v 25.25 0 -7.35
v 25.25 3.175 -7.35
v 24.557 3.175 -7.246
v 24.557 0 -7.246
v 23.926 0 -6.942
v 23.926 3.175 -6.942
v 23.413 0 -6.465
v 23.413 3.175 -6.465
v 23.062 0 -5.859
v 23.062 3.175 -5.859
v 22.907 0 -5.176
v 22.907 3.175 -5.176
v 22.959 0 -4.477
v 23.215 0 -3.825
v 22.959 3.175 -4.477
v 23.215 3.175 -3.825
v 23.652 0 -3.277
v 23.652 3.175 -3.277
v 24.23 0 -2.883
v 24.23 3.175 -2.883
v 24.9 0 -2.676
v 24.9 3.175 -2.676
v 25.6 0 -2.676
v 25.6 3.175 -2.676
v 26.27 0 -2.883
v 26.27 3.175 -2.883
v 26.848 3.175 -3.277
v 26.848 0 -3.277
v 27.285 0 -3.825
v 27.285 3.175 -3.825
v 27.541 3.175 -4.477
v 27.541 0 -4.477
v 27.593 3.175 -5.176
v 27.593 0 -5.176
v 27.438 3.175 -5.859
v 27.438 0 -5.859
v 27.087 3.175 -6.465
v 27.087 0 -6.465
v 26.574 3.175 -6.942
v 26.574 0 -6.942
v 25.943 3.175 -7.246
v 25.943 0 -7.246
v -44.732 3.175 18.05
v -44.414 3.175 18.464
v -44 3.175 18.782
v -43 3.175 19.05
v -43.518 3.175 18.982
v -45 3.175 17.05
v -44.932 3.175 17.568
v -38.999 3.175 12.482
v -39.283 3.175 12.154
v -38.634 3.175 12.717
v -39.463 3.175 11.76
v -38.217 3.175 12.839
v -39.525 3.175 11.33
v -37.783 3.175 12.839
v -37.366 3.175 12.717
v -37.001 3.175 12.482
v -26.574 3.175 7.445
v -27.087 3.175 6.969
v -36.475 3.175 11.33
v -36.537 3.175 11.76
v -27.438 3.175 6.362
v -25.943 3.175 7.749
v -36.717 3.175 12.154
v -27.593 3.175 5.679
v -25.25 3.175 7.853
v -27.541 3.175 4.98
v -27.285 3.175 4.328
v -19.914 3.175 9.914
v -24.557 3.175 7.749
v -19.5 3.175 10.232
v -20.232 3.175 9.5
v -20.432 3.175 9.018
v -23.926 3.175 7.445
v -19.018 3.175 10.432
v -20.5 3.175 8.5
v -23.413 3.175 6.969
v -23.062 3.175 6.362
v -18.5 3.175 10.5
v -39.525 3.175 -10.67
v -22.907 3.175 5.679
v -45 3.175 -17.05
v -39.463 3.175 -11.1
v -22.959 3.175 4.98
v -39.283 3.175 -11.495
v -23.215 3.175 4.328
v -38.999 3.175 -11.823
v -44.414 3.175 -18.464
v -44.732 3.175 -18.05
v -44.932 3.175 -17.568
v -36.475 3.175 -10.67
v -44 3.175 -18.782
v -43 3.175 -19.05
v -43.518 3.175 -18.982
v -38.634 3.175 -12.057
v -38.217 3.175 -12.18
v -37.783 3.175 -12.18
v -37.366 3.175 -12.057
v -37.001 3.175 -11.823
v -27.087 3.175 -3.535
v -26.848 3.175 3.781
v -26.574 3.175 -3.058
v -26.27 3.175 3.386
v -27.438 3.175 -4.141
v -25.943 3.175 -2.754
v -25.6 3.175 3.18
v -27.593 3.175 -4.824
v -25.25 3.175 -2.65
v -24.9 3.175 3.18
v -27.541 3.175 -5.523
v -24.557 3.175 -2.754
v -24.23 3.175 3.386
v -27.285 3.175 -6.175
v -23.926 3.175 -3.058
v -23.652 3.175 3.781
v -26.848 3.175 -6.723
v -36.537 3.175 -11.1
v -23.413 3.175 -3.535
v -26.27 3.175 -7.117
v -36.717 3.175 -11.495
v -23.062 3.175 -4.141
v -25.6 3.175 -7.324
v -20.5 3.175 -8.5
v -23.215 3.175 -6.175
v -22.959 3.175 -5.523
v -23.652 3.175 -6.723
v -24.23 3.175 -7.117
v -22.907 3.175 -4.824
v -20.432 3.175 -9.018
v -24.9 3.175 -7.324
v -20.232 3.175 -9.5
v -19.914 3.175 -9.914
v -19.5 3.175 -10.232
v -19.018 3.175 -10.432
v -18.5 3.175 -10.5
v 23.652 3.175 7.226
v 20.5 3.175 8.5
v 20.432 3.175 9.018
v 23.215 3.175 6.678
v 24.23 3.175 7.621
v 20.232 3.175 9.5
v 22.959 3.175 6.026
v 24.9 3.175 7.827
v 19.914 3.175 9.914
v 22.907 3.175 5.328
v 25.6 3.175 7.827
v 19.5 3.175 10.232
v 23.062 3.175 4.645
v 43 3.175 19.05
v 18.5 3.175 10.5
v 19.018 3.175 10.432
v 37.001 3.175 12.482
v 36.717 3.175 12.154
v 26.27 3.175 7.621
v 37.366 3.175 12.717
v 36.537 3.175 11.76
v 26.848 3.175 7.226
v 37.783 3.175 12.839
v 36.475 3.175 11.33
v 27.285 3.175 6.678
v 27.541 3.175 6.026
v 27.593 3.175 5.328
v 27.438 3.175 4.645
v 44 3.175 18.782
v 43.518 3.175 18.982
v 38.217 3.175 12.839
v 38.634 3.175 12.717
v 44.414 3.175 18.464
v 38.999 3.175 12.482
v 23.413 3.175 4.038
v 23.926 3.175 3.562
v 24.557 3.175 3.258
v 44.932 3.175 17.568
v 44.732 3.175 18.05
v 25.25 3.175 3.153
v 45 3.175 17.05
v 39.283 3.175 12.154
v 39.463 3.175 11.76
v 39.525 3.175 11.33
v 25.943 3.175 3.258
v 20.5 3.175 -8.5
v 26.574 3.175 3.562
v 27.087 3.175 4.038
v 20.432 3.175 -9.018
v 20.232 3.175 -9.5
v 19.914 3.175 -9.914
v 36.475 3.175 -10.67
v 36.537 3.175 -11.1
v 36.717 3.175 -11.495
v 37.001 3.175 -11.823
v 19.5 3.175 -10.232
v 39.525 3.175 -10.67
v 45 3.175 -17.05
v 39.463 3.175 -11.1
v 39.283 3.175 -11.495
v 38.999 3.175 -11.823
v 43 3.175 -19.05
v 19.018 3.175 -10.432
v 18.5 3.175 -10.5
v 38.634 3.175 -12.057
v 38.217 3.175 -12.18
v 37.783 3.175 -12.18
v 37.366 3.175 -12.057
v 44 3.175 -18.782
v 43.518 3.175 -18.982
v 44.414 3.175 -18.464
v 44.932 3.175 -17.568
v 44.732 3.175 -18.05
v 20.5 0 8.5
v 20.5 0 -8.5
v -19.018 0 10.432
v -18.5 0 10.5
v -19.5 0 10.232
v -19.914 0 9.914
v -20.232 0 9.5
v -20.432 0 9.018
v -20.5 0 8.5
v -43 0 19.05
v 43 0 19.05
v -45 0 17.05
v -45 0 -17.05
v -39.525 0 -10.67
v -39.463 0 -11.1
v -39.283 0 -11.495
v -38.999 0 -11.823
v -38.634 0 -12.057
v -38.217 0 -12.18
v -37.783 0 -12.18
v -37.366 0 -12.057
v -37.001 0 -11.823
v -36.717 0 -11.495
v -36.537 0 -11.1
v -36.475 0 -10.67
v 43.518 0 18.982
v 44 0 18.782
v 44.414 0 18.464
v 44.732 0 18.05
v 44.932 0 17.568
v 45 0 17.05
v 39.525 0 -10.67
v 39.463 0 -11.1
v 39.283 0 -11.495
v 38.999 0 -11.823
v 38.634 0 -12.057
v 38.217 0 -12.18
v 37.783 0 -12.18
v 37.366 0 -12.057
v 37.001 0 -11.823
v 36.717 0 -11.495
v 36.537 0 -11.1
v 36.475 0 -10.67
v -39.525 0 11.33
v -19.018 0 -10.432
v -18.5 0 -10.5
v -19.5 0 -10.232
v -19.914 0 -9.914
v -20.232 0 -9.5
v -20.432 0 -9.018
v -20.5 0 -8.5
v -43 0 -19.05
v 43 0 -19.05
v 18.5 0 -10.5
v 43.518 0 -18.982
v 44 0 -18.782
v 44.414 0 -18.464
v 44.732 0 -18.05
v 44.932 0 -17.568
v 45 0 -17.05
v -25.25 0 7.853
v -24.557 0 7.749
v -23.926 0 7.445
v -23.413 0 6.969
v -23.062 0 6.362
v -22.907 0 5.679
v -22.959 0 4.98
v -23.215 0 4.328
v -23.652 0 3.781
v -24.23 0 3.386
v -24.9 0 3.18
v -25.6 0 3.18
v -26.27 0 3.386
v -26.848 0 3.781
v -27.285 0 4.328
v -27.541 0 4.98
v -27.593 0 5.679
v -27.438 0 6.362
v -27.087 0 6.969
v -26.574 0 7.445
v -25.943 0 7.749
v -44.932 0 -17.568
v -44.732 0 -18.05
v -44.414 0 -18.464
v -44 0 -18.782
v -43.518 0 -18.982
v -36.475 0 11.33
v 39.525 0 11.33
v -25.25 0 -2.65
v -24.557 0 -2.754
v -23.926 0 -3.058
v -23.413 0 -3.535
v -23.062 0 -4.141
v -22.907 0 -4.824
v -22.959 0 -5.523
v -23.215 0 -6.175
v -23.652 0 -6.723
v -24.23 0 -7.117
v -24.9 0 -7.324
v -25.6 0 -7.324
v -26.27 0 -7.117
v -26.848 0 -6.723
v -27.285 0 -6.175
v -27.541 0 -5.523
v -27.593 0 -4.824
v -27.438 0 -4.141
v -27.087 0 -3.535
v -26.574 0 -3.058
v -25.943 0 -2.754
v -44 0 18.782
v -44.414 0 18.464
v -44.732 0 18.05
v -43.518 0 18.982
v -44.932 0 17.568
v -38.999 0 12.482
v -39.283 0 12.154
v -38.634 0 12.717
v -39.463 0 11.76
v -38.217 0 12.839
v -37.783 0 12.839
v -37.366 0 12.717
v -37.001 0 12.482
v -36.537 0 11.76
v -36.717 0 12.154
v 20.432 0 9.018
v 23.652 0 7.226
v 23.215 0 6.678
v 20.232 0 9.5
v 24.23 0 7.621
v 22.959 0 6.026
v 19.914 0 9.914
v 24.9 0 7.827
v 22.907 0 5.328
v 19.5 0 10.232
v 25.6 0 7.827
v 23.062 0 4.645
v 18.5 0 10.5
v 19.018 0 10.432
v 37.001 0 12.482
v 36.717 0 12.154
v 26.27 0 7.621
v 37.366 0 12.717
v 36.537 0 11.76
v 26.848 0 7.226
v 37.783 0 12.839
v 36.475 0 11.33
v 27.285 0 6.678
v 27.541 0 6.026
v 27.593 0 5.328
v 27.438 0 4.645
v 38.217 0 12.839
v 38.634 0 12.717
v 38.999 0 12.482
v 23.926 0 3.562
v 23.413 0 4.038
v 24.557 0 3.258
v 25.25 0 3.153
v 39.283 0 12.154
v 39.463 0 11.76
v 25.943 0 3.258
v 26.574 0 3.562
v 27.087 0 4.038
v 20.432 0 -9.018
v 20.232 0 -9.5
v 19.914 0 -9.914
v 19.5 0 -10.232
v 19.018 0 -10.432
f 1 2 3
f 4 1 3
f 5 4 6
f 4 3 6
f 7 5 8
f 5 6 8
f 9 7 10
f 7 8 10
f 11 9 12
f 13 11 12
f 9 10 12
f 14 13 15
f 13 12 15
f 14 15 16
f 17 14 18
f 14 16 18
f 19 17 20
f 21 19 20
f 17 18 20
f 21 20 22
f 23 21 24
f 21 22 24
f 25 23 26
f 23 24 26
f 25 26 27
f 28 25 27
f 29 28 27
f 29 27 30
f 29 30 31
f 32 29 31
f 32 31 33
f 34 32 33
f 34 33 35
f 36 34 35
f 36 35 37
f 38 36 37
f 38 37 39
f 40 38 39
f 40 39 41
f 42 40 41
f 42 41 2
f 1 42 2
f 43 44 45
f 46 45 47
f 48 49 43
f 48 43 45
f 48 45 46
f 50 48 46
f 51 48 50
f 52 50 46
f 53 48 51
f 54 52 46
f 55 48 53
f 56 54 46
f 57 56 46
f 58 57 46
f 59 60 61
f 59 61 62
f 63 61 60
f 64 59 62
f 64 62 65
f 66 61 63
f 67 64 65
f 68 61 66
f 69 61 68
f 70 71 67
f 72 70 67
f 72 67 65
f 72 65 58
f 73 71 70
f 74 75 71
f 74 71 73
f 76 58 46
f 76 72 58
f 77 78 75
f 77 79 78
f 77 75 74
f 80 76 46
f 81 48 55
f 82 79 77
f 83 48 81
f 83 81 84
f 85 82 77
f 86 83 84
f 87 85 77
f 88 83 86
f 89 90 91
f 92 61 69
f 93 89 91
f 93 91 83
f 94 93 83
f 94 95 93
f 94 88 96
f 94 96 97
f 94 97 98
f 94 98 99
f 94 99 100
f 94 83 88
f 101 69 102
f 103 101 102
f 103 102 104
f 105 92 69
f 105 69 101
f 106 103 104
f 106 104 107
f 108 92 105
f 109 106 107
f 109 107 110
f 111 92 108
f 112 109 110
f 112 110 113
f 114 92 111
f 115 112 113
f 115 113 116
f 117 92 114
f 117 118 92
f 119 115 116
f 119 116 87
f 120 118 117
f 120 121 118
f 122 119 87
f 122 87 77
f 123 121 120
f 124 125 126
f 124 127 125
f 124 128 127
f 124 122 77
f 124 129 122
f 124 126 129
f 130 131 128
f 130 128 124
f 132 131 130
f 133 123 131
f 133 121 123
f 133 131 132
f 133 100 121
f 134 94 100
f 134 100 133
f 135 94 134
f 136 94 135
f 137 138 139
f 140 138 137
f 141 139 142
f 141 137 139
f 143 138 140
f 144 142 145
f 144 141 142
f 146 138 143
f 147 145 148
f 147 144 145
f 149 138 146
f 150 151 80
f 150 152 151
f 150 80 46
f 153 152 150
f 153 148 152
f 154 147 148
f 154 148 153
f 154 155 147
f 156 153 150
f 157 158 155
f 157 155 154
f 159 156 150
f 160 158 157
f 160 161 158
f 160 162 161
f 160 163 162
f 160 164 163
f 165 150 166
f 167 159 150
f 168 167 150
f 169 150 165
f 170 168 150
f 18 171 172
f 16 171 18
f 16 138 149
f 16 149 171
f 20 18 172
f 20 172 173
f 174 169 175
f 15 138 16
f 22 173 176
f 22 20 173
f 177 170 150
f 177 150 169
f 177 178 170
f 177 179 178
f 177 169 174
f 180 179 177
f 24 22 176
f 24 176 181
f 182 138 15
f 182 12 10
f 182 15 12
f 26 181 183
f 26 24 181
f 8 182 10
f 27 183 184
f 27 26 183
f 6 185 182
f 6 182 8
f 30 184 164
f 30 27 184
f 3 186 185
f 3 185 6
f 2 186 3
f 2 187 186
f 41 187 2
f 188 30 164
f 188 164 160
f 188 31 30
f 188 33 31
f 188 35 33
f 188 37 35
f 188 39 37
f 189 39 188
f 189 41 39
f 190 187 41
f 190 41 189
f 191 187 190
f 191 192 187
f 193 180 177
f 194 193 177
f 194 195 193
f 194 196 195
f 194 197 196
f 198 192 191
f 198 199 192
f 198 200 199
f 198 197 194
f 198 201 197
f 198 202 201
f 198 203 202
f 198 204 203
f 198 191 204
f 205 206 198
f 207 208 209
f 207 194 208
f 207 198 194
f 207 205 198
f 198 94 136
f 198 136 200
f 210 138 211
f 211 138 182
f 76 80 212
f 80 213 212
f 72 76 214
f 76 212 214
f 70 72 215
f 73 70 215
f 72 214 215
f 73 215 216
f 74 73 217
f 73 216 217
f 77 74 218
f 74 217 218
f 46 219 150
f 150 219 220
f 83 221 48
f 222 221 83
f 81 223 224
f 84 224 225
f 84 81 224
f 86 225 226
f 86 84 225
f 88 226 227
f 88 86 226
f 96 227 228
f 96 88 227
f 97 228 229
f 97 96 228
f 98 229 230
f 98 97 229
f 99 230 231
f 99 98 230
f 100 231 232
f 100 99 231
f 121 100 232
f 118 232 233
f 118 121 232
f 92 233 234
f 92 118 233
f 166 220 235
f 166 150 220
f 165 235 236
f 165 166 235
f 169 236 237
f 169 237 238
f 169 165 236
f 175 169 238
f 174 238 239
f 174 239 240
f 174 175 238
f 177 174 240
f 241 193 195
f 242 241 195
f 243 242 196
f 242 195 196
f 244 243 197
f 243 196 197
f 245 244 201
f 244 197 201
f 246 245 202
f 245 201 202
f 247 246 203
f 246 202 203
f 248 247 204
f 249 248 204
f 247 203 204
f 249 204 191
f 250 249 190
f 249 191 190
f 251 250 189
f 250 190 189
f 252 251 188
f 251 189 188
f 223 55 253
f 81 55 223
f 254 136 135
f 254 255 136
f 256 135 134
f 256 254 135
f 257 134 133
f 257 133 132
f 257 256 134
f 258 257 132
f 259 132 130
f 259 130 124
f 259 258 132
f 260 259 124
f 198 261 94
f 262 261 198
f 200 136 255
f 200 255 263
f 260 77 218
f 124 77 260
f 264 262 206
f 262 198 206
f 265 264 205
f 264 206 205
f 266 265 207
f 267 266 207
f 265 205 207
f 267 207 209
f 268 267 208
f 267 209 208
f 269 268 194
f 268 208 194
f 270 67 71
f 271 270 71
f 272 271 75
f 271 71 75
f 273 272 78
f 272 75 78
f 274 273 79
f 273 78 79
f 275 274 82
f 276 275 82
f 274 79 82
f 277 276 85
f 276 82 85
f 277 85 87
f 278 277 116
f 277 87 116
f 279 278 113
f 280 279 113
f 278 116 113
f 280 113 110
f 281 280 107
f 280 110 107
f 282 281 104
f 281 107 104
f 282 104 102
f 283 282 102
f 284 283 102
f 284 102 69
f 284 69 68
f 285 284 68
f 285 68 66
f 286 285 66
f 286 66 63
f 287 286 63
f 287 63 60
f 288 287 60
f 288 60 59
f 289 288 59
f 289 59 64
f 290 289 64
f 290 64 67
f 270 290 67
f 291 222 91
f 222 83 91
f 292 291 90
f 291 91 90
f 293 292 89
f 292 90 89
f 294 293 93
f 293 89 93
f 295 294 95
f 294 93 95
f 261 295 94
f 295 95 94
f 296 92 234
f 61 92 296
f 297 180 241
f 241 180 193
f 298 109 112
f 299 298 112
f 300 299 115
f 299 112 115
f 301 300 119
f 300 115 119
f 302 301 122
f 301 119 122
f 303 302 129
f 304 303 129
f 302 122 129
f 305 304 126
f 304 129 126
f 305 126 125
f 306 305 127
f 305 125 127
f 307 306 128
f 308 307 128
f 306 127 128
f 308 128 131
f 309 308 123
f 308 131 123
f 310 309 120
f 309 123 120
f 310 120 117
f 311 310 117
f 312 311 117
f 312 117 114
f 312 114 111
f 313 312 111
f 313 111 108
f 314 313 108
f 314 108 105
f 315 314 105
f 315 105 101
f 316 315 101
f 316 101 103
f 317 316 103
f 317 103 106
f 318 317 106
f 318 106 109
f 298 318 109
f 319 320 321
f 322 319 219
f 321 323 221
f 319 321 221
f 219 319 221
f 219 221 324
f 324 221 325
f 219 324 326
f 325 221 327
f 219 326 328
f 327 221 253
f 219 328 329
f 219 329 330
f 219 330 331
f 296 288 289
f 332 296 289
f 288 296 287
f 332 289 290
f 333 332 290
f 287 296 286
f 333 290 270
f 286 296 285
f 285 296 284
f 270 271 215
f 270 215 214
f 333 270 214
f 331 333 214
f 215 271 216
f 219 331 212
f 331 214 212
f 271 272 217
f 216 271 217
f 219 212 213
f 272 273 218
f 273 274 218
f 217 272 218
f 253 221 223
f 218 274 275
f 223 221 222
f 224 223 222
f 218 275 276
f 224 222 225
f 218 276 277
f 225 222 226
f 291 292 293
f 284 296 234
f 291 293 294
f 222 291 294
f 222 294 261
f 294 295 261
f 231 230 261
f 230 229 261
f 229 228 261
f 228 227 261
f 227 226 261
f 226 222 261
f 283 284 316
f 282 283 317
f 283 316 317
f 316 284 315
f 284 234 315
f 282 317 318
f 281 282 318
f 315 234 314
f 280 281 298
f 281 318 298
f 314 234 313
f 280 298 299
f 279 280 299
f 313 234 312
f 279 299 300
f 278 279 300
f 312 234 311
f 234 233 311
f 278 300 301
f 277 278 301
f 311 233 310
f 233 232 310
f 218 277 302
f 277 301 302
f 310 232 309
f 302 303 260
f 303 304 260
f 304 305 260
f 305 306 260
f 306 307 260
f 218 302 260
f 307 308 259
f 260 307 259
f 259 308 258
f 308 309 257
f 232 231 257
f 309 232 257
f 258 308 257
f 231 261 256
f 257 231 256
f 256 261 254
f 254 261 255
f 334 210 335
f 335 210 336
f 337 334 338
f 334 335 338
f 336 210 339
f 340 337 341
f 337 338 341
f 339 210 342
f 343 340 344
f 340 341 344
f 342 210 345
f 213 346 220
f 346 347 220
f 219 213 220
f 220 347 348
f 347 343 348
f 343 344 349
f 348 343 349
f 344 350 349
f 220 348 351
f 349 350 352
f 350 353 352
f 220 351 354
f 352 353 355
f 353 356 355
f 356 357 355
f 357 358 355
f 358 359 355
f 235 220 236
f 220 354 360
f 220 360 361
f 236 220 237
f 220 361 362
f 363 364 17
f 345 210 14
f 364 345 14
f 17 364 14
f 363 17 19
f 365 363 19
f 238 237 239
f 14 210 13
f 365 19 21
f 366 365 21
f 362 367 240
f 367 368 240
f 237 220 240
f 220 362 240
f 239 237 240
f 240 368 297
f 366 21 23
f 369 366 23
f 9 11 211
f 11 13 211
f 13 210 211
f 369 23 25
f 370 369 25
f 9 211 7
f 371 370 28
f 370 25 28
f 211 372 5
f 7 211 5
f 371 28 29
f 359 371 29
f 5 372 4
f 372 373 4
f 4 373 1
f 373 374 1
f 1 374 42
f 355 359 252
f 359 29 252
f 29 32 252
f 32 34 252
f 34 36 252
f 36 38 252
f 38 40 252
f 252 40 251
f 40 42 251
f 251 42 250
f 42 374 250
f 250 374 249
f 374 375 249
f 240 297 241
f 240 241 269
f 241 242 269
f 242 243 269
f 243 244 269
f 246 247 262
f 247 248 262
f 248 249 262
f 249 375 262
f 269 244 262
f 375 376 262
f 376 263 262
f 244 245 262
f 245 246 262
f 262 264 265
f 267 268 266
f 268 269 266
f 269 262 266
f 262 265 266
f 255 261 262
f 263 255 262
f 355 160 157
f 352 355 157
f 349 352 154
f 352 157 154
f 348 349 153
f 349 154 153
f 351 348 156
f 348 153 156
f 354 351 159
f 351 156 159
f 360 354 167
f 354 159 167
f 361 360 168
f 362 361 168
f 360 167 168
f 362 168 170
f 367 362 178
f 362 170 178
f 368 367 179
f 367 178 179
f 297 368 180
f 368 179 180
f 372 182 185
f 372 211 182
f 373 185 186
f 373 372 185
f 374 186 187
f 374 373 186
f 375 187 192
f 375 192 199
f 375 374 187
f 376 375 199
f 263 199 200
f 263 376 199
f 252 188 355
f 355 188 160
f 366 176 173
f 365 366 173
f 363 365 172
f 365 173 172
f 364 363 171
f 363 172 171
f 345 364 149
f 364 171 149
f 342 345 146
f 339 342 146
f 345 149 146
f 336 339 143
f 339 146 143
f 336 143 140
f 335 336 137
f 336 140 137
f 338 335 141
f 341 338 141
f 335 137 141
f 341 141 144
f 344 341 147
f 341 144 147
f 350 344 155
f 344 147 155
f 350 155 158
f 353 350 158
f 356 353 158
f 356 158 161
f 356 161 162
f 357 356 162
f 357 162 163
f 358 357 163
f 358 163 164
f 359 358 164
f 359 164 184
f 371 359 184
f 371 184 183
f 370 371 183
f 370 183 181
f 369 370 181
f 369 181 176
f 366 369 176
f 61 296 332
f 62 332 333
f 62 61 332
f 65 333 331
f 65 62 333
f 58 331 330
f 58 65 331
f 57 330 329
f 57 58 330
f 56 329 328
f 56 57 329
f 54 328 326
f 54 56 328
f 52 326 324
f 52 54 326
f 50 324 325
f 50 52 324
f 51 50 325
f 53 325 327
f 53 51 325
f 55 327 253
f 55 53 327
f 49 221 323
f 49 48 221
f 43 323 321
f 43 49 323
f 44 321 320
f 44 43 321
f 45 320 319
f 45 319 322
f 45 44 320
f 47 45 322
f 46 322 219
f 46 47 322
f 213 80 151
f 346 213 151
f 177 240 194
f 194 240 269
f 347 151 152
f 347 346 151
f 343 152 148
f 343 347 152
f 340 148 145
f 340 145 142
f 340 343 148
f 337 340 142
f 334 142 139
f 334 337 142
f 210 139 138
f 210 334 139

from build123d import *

# Parameters (mm, degrees)
SKETCH1_W           = 90
SKETCH1_H           = 38.1
BOSS_EXTRUDE1_DEPTH = 3.175
SKETCH2_R           = 2.35
SKETCH2_W           = 41
SKETCH2_H           = 21
CUT_EXTRUDE1_DEPTH  = 49.969205885
FILLET1_R           = 2
CUT_EXTRUDE2_DEPTH  = 49.969205885


with BuildPart() as part:
    # Sketch1 → Boss-Extrude1 (new body)
    with BuildSketch(Plane(origin=(0, 0, 0), x_dir=(1, 0, 0), z_dir=(0, 1, 0))):
        Rectangle(SKETCH1_W, SKETCH1_H)
    extrude(amount=BOSS_EXTRUDE1_DEPTH)

    # Sketch2 → Cut-Extrude1 (cut, through all)
    with BuildSketch(Plane(origin=(0, 3.175, 0), x_dir=(1, 0, 0), z_dir=(0, 1, 0))):
        with Locations(Location((-25.25, 5, 0), (0, 0, 270))):
            Circle(SKETCH2_R)
        with Locations(Location((-25.25, -5.503329438, 0), (0, 0, 270))):
            Circle(SKETCH2_R)
        with Locations(Location((25.25, 5, 0), (0, 0, 90))):
            Circle(SKETCH2_R)
        with Locations(Location((25.25, -5.503329438, 0), (0, 0, 90))):
            Circle(SKETCH2_R)
        Rectangle(SKETCH2_W, SKETCH2_H)
    extrude(amount=-CUT_EXTRUDE1_DEPTH, mode=Mode.SUBTRACT)

    # Fillet1
    fillet1_edges = [part.edges().sort_by_distance(p)[0] for p in [
        (-20.5, 1.5875, 10.5),
        (-20.5, 1.5875, -10.5),
        (20.5, 1.5875, -10.5),
        (20.5, 1.5875, 10.5),
        (-45, 1.5875, -19.05),
        (45, 1.5875, -19.05),
        (45, 1.5875, 19.05),
        (-45, 1.5875, 19.05),
    ]]
    fillet(fillet1_edges, radius=FILLET1_R)

    # Sketch3 → Cut-Extrude2 (cut, through all)
    with BuildSketch(Plane(origin=(0, 3.175, 0), x_dir=(1, 0, 0), z_dir=(0, 1, 0))):
        with BuildLine():
            Line((-36.475, 10.670041553), (-36.475, -11.329958447))
            ThreePointArc((-36.475, -11.329958447), (-38, -12.854958447), (-39.525, -11.329958447))
            Line((-39.525, -11.329958447), (-39.525, 10.670041553))
            ThreePointArc((-39.525, 10.670041553), (-38, 12.195041553), (-36.475, 10.670041553))
        make_face()
        with BuildLine():
            Line((36.475, 10.670041553), (36.475, -11.329958447))
            ThreePointArc((36.475, -11.329958447), (38, -12.854958447), (39.525, -11.329958447))
            Line((39.525, -11.329958447), (39.525, 10.670041553))
            ThreePointArc((39.525, 10.670041553), (38, 12.195041553), (36.475, 10.670041553))
        make_face()
    extrude(amount=-CUT_EXTRUDE2_DEPTH, mode=Mode.SUBTRACT)


solid = part.part
